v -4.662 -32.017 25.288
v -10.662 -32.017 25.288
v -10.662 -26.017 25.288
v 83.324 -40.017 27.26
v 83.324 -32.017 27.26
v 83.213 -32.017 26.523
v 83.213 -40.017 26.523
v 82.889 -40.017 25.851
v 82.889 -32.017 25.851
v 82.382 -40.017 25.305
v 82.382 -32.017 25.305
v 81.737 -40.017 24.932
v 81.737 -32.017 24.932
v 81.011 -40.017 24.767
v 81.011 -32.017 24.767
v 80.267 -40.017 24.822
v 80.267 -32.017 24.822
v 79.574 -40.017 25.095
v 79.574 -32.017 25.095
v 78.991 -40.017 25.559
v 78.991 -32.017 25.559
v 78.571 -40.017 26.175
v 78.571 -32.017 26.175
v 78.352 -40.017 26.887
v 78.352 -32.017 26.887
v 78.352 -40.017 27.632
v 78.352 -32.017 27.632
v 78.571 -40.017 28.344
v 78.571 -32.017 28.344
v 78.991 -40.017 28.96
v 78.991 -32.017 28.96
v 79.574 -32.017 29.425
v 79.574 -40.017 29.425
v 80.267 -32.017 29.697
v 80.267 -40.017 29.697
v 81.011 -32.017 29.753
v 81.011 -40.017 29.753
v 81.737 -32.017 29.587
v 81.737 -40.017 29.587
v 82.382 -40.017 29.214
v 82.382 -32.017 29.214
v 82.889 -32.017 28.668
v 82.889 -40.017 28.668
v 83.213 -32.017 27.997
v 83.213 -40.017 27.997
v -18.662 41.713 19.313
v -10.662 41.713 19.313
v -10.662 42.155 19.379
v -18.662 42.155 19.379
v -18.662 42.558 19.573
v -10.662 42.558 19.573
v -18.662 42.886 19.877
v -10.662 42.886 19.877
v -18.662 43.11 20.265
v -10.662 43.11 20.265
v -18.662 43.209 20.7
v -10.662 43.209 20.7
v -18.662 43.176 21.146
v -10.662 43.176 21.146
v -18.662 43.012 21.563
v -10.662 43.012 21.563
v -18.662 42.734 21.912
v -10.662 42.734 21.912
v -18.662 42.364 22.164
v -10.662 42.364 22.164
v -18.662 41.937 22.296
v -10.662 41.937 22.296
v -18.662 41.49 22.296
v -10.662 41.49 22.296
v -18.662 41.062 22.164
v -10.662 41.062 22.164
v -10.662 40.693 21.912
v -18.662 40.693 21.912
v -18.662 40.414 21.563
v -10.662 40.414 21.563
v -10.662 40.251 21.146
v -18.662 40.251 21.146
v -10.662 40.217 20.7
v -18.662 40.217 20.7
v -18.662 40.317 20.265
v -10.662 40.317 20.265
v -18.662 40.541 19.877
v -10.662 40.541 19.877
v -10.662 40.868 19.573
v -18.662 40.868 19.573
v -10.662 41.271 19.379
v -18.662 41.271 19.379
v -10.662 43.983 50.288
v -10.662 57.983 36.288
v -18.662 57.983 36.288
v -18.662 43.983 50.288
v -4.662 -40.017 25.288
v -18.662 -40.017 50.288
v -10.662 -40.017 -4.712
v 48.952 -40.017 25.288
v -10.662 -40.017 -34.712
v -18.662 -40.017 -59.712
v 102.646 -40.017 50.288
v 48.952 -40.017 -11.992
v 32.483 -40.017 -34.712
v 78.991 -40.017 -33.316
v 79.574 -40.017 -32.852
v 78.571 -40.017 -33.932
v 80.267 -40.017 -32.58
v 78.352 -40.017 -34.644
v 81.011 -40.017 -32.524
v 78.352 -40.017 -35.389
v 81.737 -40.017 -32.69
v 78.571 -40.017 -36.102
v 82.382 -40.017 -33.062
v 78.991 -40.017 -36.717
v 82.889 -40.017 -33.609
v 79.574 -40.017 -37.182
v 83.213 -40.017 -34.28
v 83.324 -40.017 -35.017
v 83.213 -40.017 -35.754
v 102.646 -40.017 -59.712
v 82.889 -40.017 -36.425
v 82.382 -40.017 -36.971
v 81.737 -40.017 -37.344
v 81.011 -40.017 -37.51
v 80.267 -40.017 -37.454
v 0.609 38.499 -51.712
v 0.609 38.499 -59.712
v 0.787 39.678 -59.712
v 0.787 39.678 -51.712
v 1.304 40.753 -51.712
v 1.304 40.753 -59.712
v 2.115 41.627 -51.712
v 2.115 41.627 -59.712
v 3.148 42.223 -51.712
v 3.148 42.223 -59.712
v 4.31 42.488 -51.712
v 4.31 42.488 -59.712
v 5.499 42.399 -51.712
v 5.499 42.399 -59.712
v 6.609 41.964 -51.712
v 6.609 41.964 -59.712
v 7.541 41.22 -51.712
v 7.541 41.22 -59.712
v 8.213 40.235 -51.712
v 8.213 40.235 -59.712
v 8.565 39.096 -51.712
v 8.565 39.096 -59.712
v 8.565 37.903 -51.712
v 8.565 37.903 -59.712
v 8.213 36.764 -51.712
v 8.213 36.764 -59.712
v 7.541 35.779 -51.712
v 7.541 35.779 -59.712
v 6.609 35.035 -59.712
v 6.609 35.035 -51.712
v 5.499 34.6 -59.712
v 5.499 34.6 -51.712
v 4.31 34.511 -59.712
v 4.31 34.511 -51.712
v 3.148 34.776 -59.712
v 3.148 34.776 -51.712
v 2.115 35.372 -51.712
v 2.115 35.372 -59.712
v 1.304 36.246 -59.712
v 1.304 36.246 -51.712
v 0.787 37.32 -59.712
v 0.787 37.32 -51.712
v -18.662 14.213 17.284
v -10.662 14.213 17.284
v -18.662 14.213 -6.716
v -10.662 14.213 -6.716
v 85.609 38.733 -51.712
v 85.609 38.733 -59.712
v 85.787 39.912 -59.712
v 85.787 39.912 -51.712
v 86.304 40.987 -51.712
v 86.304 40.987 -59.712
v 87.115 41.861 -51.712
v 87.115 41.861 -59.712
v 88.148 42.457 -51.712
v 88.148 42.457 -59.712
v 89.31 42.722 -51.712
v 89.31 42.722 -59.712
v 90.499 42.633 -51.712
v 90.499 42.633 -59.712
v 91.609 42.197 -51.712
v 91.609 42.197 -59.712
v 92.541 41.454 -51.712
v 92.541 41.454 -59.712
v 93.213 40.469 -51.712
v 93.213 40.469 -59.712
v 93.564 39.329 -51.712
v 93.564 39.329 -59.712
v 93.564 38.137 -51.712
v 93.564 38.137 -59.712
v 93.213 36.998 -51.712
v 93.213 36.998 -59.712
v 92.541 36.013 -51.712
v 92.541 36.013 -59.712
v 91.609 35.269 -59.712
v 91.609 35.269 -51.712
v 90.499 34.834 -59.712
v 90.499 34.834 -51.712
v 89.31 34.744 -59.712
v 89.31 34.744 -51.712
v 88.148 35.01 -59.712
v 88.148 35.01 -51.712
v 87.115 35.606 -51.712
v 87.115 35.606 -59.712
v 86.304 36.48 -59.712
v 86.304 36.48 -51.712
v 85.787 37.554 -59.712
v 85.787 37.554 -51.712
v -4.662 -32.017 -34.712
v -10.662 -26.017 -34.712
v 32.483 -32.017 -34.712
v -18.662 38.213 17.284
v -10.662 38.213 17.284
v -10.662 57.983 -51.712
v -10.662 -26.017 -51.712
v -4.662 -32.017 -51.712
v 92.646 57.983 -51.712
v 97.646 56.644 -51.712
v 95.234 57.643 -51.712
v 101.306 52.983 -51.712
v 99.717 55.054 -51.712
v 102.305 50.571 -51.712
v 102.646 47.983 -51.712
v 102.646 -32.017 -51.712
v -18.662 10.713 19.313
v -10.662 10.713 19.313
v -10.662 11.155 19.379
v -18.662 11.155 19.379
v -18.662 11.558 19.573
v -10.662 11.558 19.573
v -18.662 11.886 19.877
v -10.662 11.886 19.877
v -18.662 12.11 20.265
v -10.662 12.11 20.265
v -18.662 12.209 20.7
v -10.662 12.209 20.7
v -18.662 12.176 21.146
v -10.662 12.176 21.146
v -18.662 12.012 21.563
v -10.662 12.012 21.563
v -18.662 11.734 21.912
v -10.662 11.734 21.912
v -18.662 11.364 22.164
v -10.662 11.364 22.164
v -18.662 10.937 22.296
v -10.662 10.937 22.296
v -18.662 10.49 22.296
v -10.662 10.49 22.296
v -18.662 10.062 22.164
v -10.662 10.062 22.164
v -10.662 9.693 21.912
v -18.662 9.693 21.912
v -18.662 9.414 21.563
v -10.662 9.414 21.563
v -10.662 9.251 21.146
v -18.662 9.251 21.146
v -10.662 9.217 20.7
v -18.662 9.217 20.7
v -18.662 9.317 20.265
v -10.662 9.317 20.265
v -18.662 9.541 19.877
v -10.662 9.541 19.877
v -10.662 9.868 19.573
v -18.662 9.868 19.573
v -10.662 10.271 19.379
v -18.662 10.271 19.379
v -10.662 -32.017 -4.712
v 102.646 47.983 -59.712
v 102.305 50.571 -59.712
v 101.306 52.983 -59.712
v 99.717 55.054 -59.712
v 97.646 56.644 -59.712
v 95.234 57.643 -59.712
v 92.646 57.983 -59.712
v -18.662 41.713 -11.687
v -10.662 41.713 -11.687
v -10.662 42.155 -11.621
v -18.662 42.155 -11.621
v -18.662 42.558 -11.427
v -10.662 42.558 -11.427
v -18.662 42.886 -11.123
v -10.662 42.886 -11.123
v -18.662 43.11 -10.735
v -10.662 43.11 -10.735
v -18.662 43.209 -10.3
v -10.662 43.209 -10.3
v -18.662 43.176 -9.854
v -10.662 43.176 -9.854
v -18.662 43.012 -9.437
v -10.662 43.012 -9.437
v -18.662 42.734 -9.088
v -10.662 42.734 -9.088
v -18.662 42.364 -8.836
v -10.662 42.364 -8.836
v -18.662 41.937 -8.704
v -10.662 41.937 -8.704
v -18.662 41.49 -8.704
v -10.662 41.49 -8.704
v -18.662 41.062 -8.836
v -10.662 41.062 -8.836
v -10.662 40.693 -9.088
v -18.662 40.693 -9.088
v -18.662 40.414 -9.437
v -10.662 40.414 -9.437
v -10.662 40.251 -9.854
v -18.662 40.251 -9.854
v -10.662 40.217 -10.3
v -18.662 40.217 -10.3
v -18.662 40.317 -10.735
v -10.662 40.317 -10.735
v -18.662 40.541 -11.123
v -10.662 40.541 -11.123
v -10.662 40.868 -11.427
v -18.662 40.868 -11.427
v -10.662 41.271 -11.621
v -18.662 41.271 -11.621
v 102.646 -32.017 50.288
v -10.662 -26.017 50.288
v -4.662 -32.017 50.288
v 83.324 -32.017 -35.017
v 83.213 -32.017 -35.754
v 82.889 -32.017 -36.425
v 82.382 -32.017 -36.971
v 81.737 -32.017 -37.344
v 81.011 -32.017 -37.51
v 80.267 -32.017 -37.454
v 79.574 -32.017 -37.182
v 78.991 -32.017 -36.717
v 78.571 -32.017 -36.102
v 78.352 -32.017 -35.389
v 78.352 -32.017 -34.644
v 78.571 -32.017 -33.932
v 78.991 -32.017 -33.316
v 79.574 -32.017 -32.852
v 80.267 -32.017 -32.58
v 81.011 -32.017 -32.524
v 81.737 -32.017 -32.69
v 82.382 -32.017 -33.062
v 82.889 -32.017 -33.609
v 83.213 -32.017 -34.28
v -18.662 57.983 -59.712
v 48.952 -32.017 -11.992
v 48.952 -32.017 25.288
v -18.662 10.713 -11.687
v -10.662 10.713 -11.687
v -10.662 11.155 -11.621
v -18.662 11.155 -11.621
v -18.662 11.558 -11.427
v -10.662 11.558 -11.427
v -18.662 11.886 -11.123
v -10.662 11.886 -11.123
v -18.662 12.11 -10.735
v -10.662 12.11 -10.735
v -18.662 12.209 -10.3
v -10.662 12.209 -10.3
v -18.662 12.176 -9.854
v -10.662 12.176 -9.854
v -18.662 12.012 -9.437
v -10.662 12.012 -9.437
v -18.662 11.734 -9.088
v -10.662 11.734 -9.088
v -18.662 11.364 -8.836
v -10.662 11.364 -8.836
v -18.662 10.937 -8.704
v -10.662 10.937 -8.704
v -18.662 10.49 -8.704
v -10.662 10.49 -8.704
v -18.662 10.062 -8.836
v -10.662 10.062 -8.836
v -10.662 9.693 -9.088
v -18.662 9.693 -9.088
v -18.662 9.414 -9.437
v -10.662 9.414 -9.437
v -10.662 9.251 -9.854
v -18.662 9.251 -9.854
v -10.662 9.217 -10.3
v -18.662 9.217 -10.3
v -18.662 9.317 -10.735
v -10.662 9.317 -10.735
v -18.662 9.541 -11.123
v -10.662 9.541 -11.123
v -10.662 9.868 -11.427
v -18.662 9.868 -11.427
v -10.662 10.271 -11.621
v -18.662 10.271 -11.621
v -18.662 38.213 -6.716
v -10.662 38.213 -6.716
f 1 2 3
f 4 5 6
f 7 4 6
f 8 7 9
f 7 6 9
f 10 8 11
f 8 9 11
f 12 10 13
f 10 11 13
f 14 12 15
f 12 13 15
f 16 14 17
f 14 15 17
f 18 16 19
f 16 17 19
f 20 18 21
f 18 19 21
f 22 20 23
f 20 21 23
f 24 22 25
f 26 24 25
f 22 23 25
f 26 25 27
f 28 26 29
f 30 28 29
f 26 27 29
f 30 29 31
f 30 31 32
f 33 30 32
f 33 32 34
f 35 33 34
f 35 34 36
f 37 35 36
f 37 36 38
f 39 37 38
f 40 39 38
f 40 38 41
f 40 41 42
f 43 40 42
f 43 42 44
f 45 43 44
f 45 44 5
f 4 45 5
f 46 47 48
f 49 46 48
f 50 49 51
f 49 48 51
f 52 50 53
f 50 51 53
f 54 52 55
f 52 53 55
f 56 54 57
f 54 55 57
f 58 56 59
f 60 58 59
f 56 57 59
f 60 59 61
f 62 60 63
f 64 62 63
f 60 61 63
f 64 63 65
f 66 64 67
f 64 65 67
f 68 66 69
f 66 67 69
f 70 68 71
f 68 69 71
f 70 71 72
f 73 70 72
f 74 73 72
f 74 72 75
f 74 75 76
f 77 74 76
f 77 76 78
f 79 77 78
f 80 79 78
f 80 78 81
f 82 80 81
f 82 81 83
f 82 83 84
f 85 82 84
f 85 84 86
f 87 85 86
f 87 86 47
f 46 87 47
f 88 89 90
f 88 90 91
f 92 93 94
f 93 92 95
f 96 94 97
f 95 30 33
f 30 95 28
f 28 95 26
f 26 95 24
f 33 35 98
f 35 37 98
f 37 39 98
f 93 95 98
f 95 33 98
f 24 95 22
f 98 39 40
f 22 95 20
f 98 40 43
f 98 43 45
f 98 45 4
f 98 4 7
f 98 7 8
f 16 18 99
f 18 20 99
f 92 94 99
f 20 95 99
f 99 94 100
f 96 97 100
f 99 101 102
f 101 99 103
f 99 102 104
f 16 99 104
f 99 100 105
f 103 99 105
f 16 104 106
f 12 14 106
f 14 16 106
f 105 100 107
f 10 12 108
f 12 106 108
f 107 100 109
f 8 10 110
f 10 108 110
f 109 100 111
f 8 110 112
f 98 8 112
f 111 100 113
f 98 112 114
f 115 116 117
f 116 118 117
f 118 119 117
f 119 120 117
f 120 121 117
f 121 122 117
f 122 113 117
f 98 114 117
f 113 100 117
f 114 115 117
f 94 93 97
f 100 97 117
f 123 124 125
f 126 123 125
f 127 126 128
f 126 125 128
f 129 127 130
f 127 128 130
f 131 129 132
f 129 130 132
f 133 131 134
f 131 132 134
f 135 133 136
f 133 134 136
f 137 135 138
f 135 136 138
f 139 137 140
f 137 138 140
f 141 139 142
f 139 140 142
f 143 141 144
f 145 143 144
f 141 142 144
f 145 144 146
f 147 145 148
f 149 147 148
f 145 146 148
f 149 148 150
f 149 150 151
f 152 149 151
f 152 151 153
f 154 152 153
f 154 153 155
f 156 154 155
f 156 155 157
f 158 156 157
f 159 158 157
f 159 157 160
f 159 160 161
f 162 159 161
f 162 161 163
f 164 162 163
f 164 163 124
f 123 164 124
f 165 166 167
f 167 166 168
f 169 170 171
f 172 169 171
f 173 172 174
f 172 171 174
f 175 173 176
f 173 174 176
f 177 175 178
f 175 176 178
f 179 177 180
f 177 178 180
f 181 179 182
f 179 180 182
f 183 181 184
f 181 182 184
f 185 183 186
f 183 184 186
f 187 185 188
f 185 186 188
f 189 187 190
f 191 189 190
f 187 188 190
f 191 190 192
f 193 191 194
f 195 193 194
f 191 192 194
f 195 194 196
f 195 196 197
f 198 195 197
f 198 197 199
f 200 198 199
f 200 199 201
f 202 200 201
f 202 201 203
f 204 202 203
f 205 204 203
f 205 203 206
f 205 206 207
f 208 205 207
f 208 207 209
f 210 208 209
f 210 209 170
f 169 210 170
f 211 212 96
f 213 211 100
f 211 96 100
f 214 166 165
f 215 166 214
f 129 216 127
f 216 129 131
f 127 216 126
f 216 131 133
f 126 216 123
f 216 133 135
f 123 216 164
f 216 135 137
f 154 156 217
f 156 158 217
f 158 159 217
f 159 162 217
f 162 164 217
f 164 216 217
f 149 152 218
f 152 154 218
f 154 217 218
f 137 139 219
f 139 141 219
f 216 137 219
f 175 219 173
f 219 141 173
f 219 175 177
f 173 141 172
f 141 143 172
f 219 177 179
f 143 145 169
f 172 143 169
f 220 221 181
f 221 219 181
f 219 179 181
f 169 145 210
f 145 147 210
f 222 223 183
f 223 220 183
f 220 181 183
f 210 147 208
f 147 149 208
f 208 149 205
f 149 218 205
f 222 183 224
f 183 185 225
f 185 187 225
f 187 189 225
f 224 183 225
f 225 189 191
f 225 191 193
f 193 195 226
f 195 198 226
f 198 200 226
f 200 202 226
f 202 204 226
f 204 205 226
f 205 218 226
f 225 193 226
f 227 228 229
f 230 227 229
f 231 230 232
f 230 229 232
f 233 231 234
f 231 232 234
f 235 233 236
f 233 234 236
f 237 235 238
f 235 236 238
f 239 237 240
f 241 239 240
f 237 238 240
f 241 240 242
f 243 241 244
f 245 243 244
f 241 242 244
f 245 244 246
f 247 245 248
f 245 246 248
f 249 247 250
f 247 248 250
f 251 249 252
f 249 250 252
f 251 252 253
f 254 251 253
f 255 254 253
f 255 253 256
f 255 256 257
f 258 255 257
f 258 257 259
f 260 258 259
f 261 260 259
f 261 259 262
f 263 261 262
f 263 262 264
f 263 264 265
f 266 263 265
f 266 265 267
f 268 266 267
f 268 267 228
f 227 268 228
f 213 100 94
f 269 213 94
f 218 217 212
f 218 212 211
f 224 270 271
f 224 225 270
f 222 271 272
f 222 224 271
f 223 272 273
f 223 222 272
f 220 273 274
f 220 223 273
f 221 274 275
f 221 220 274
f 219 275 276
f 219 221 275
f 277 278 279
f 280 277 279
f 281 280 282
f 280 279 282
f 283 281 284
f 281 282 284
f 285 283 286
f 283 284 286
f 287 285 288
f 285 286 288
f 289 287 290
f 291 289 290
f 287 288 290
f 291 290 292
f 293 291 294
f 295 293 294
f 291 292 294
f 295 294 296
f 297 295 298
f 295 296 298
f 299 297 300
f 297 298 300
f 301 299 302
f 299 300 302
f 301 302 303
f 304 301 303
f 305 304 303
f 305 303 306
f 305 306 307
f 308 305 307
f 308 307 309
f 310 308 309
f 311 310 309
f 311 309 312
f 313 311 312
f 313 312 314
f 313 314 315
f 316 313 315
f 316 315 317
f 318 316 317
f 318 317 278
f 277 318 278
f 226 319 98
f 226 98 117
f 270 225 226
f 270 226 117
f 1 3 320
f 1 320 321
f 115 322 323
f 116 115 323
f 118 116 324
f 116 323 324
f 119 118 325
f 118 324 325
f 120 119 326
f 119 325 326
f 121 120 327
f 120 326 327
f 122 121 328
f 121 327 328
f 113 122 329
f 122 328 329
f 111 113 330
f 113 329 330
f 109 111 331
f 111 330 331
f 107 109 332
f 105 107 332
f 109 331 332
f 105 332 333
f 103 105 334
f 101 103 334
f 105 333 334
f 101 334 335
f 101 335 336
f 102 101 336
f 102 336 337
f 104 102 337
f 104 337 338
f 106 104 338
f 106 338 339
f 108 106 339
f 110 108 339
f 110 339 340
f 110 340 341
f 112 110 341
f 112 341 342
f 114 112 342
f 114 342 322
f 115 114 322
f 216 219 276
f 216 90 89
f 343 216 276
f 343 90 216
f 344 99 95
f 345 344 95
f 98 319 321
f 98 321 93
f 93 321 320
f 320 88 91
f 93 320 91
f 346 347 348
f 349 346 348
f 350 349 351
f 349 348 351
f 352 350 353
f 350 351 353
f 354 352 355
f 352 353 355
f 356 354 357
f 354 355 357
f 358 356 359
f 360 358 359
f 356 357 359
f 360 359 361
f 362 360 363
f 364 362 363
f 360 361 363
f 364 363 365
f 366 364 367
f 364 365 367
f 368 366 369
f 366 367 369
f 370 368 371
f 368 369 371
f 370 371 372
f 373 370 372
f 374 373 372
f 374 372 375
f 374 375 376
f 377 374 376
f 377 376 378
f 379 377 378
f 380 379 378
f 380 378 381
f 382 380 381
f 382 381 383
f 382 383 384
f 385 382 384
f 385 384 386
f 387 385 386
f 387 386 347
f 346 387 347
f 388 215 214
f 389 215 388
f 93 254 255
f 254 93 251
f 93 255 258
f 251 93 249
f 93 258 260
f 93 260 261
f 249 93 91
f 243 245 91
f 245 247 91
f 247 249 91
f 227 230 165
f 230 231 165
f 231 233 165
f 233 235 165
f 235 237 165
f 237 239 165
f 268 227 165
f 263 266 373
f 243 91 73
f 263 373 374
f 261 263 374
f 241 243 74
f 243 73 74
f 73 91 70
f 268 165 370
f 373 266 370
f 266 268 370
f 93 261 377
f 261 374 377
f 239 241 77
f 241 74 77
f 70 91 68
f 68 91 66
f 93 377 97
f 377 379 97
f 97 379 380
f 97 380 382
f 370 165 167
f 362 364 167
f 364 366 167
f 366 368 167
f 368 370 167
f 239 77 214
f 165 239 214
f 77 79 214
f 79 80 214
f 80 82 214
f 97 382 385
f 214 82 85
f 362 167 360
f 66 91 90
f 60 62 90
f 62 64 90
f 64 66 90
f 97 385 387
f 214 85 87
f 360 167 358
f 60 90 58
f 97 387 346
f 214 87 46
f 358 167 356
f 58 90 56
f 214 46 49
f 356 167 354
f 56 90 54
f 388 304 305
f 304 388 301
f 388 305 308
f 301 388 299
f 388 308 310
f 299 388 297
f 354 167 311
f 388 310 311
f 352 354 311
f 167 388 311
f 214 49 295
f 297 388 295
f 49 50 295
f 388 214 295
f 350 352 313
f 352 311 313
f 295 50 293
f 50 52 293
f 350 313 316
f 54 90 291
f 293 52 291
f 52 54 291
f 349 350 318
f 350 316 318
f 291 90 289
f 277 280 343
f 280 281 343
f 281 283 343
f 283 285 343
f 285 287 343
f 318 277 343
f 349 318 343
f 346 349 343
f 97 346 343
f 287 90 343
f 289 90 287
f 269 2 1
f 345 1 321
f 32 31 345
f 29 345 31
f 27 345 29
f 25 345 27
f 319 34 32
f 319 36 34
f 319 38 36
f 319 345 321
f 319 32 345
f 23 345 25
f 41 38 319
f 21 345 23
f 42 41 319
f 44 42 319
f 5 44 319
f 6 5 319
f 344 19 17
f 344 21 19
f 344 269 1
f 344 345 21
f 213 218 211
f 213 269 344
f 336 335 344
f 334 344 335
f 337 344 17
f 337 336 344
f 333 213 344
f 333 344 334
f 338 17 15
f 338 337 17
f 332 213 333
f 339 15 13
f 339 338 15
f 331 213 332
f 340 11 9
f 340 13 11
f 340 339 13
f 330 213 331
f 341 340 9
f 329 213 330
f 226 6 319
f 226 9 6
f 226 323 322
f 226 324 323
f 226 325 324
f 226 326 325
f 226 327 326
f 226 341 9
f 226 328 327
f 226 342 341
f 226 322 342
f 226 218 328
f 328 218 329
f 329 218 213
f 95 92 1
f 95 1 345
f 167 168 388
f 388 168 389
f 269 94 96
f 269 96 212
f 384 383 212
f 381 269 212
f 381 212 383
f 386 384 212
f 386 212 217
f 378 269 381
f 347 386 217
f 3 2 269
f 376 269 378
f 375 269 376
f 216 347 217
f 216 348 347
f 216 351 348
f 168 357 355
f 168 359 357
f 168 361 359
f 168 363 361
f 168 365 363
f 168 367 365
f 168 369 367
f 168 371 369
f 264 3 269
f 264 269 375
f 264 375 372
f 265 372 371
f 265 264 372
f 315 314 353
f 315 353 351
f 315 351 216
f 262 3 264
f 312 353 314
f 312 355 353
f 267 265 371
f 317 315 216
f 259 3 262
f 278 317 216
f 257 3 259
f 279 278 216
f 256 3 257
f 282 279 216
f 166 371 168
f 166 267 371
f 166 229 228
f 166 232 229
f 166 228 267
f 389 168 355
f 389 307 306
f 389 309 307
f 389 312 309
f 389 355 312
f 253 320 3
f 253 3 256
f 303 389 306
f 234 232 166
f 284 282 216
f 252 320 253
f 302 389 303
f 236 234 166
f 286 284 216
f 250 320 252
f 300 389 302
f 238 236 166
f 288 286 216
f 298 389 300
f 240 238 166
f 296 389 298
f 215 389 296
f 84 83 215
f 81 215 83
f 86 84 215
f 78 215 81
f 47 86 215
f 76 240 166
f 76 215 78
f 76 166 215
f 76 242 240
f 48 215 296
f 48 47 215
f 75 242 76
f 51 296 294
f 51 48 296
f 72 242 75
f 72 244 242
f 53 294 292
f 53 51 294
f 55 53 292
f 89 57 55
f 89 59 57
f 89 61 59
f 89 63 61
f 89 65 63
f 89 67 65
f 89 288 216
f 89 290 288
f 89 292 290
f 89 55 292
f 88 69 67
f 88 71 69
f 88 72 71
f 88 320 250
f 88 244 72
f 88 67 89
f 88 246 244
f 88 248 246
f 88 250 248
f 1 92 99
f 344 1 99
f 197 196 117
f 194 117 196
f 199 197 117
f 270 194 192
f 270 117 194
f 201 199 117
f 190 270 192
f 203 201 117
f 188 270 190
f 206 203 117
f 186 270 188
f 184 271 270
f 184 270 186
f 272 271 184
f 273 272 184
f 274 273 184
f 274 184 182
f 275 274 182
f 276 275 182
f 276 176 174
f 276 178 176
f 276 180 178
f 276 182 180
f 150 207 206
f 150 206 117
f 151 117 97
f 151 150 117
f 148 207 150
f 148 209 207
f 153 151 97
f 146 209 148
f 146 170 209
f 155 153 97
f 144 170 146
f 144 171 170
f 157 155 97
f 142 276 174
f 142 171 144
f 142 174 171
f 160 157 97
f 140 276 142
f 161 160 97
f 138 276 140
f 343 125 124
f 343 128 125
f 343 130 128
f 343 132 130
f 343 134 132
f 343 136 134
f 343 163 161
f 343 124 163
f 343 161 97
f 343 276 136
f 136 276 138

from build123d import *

# Parameters (mm, degrees)
SKETCH2_W            = 45
SKETCH2_H            = 45
BOSS_EXTRUDE1_DEPTH  = 4
SKETCH3_R            = 0.75
CUT_EXTRUDE1_DEPTH   = 5
SKETCH4_W            = 12
SKETCH4_H            = 12
CUT_EXTRUDE2_DEPTH   = 5
SKETCH5_W            = 55
SKETCH5_H            = 4
BOSS_EXTRUDE2_DEPTH  = 60.654134022
SKETCH7_W            = 4
SKETCH7_H            = 49
BOSS_EXTRUDE3_DEPTH  = 10
CUT_EXTRUDE6_DEPTH   = 5
BOSS_EXTRUDE4_DEPTH  = 55
SKETCH12_W           = 29.80716229
SKETCH12_H           = 30
CUT_EXTRUDE7_DEPTH   = 50
SCALE2_SCALE         = 2
BOSS_EXTRUDE10_DEPTH = 8
SKETCH29_W           = 121.308268044
SKETCH29_H           = 8
BOSS_EXTRUDE11_DEPTH = 98
SKETCH30_R           = 2.5
CUT_EXTRUDE8_DEPTH   = 98
SKETCH31_R           = 2.5
CUT_EXTRUDE9_DEPTH   = 98
SKETCH32_R           = 4
CUT_EXTRUDE10_DEPTH  = 98
FILLET1_R            = 10


with BuildPart() as part:
    # Sketch2 → Boss-Extrude1 (new body)
    with BuildSketch(Plane(origin=(0, 0, 0), x_dir=(0, 0, -1), z_dir=(1, 0, 0))):
        Rectangle(SKETCH2_W, SKETCH2_H)
    extrude(amount=BOSS_EXTRUDE1_DEPTH)

    # Sketch3 → Cut-Extrude1 (cut)
    with BuildSketch(Plane(origin=(4, 0, 0), x_dir=(0, 0, -1), z_dir=(1, 0, 0))):
        with Locations((-7.762444982, 14.365)):
            Circle(SKETCH3_R)
        with Locations((-7.762444982, -1.135)):
            Circle(SKETCH3_R)
        with Locations((7.737555018, -1.135)):
            Circle(SKETCH3_R)
        with Locations((7.737555018, 14.365)):
            Circle(SKETCH3_R)
    extrude(amount=-CUT_EXTRUDE1_DEPTH, mode=Mode.SUBTRACT)

    # Sketch4 → Cut-Extrude2 (cut)
    with BuildSketch(Plane(origin=(4, 0, 0), x_dir=(0, 0, -1), z_dir=(1, 0, 0))):
        with Locations((0.001587774, 6.615)):
            Rectangle(SKETCH4_W, SKETCH4_H)
    extrude(amount=-CUT_EXTRUDE2_DEPTH, mode=Mode.SUBTRACT)

    # Sketch5 → Boss-Extrude2 (add)
    with BuildSketch(Plane(origin=(0, 0, 0), x_dir=(0, 0, -1), z_dir=(1, 0, 0))):
        with Locations((5, -24.5)):
            Rectangle(SKETCH5_W, SKETCH5_H)
    extrude(amount=BOSS_EXTRUDE2_DEPTH)

    # Sketch7 → Boss-Extrude3 (add)
    with BuildSketch(Plane(origin=(0, 0, -22.5), x_dir=(-1, 0, 0), z_dir=(0, 0, -1))):
        with Locations((-2, -2)):
            Rectangle(SKETCH7_W, SKETCH7_H)
    extrude(amount=BOSS_EXTRUDE3_DEPTH)

    # Sketch9 → Cut-Extrude6 (cut, through all)
    with BuildSketch(Plane(origin=(4, 0, 0), x_dir=(0, 0, -1), z_dir=(1, 0, 0))):
        Polygon((-22.5, 15.5), (-22.5, 22.5), (-15.5, 22.5), align=None)
    extrude(amount=-CUT_EXTRUDE6_DEPTH, mode=Mode.SUBTRACT)

    # Sketch11 → Boss-Extrude4 (add)
    with BuildSketch(Plane.XY.offset(22.5)):
        Polygon((4, -19.5), (7, -22.5), (4, -22.5), align=None)
    extrude(amount=-BOSS_EXTRUDE4_DEPTH)

    # Sketch12 → Cut-Extrude7 (cut, through all)
    with BuildSketch(Plane.XZ.offset(26.5)):
        with Locations((18.903581145, -5)):
            Rectangle(SKETCH12_W, SKETCH12_H)
    extrude(amount=-CUT_EXTRUDE7_DEPTH, mode=Mode.SUBTRACT)


with BuildPart() as part_1:
    # Scale2: scaled about (18.662210537, -12.9832523, -5.287627144)
    add(part.part.scale(SCALE2_SCALE).moved(Location((-18.662210537, 12.9832523, 5.287627144))))

    # Sketch21 → Boss-Extrude10 (add)
    with BuildSketch(Plane(origin=(0, -40.0167477, 0), x_dir=(-1, 0, 0), z_dir=(0, -1, 0))):
        Polygon((10.662210537, -25.287627144), (4.662210537, -25.287627144), (-48.952114042, 11.991594358), (-48.952114042, 34.712372856), (-32.483264947, 34.712372856), (10.662210537, 4.712372856), align=None)
    extrude(amount=-BOSS_EXTRUDE10_DEPTH)

    # Sketch29 → Boss-Extrude11 (add)
    with BuildSketch(Plane.XZ.offset(40.0167477)):
        with Locations((41.991923485, -55.712372856)):
            Rectangle(SKETCH29_W, SKETCH29_H)
    extrude(amount=-BOSS_EXTRUDE11_DEPTH)

    # Sketch30 → Cut-Extrude8 (cut)
    with BuildSketch(Plane(origin=(0, -32.0167477, 0), x_dir=(1, 0, 0), z_dir=(0, 1, 0))):
        with Locations((80.823761479, -27.259651972)):
            Circle(SKETCH30_R)
    extrude(amount=-CUT_EXTRUDE8_DEPTH, mode=Mode.SUBTRACT)

    # Sketch31 → Cut-Extrude9 (cut)
    with BuildSketch(Plane(origin=(0, -32.0167477, 0), x_dir=(1, 0, 0), z_dir=(0, 1, 0))):
        with Locations((80.823761479, 35.016859129)):
            Circle(SKETCH31_R)
    extrude(amount=-CUT_EXTRUDE9_DEPTH, mode=Mode.SUBTRACT)

    # Sketch32 → Cut-Extrude10 (cut)
    with BuildSketch(Plane(origin=(0, 0, -59.712372856), x_dir=(-1, 0, 0), z_dir=(0, 0, -1))):
        with Locations((-89.60887453, 38.7332523)):
            Circle(SKETCH32_R)
        with Locations((-4.609196036, 38.499466475)):
            Circle(SKETCH32_R)
    extrude(amount=-CUT_EXTRUDE10_DEPTH, mode=Mode.SUBTRACT)

    # Fillet1
    fillet1_edges = [part_1.edges().sort_by_distance(p)[0] for p in [
        (102.646057507, 57.9832523, -55.712372856),
    ]]
    fillet(fillet1_edges, radius=FILLET1_R)


solid = part_1.part
